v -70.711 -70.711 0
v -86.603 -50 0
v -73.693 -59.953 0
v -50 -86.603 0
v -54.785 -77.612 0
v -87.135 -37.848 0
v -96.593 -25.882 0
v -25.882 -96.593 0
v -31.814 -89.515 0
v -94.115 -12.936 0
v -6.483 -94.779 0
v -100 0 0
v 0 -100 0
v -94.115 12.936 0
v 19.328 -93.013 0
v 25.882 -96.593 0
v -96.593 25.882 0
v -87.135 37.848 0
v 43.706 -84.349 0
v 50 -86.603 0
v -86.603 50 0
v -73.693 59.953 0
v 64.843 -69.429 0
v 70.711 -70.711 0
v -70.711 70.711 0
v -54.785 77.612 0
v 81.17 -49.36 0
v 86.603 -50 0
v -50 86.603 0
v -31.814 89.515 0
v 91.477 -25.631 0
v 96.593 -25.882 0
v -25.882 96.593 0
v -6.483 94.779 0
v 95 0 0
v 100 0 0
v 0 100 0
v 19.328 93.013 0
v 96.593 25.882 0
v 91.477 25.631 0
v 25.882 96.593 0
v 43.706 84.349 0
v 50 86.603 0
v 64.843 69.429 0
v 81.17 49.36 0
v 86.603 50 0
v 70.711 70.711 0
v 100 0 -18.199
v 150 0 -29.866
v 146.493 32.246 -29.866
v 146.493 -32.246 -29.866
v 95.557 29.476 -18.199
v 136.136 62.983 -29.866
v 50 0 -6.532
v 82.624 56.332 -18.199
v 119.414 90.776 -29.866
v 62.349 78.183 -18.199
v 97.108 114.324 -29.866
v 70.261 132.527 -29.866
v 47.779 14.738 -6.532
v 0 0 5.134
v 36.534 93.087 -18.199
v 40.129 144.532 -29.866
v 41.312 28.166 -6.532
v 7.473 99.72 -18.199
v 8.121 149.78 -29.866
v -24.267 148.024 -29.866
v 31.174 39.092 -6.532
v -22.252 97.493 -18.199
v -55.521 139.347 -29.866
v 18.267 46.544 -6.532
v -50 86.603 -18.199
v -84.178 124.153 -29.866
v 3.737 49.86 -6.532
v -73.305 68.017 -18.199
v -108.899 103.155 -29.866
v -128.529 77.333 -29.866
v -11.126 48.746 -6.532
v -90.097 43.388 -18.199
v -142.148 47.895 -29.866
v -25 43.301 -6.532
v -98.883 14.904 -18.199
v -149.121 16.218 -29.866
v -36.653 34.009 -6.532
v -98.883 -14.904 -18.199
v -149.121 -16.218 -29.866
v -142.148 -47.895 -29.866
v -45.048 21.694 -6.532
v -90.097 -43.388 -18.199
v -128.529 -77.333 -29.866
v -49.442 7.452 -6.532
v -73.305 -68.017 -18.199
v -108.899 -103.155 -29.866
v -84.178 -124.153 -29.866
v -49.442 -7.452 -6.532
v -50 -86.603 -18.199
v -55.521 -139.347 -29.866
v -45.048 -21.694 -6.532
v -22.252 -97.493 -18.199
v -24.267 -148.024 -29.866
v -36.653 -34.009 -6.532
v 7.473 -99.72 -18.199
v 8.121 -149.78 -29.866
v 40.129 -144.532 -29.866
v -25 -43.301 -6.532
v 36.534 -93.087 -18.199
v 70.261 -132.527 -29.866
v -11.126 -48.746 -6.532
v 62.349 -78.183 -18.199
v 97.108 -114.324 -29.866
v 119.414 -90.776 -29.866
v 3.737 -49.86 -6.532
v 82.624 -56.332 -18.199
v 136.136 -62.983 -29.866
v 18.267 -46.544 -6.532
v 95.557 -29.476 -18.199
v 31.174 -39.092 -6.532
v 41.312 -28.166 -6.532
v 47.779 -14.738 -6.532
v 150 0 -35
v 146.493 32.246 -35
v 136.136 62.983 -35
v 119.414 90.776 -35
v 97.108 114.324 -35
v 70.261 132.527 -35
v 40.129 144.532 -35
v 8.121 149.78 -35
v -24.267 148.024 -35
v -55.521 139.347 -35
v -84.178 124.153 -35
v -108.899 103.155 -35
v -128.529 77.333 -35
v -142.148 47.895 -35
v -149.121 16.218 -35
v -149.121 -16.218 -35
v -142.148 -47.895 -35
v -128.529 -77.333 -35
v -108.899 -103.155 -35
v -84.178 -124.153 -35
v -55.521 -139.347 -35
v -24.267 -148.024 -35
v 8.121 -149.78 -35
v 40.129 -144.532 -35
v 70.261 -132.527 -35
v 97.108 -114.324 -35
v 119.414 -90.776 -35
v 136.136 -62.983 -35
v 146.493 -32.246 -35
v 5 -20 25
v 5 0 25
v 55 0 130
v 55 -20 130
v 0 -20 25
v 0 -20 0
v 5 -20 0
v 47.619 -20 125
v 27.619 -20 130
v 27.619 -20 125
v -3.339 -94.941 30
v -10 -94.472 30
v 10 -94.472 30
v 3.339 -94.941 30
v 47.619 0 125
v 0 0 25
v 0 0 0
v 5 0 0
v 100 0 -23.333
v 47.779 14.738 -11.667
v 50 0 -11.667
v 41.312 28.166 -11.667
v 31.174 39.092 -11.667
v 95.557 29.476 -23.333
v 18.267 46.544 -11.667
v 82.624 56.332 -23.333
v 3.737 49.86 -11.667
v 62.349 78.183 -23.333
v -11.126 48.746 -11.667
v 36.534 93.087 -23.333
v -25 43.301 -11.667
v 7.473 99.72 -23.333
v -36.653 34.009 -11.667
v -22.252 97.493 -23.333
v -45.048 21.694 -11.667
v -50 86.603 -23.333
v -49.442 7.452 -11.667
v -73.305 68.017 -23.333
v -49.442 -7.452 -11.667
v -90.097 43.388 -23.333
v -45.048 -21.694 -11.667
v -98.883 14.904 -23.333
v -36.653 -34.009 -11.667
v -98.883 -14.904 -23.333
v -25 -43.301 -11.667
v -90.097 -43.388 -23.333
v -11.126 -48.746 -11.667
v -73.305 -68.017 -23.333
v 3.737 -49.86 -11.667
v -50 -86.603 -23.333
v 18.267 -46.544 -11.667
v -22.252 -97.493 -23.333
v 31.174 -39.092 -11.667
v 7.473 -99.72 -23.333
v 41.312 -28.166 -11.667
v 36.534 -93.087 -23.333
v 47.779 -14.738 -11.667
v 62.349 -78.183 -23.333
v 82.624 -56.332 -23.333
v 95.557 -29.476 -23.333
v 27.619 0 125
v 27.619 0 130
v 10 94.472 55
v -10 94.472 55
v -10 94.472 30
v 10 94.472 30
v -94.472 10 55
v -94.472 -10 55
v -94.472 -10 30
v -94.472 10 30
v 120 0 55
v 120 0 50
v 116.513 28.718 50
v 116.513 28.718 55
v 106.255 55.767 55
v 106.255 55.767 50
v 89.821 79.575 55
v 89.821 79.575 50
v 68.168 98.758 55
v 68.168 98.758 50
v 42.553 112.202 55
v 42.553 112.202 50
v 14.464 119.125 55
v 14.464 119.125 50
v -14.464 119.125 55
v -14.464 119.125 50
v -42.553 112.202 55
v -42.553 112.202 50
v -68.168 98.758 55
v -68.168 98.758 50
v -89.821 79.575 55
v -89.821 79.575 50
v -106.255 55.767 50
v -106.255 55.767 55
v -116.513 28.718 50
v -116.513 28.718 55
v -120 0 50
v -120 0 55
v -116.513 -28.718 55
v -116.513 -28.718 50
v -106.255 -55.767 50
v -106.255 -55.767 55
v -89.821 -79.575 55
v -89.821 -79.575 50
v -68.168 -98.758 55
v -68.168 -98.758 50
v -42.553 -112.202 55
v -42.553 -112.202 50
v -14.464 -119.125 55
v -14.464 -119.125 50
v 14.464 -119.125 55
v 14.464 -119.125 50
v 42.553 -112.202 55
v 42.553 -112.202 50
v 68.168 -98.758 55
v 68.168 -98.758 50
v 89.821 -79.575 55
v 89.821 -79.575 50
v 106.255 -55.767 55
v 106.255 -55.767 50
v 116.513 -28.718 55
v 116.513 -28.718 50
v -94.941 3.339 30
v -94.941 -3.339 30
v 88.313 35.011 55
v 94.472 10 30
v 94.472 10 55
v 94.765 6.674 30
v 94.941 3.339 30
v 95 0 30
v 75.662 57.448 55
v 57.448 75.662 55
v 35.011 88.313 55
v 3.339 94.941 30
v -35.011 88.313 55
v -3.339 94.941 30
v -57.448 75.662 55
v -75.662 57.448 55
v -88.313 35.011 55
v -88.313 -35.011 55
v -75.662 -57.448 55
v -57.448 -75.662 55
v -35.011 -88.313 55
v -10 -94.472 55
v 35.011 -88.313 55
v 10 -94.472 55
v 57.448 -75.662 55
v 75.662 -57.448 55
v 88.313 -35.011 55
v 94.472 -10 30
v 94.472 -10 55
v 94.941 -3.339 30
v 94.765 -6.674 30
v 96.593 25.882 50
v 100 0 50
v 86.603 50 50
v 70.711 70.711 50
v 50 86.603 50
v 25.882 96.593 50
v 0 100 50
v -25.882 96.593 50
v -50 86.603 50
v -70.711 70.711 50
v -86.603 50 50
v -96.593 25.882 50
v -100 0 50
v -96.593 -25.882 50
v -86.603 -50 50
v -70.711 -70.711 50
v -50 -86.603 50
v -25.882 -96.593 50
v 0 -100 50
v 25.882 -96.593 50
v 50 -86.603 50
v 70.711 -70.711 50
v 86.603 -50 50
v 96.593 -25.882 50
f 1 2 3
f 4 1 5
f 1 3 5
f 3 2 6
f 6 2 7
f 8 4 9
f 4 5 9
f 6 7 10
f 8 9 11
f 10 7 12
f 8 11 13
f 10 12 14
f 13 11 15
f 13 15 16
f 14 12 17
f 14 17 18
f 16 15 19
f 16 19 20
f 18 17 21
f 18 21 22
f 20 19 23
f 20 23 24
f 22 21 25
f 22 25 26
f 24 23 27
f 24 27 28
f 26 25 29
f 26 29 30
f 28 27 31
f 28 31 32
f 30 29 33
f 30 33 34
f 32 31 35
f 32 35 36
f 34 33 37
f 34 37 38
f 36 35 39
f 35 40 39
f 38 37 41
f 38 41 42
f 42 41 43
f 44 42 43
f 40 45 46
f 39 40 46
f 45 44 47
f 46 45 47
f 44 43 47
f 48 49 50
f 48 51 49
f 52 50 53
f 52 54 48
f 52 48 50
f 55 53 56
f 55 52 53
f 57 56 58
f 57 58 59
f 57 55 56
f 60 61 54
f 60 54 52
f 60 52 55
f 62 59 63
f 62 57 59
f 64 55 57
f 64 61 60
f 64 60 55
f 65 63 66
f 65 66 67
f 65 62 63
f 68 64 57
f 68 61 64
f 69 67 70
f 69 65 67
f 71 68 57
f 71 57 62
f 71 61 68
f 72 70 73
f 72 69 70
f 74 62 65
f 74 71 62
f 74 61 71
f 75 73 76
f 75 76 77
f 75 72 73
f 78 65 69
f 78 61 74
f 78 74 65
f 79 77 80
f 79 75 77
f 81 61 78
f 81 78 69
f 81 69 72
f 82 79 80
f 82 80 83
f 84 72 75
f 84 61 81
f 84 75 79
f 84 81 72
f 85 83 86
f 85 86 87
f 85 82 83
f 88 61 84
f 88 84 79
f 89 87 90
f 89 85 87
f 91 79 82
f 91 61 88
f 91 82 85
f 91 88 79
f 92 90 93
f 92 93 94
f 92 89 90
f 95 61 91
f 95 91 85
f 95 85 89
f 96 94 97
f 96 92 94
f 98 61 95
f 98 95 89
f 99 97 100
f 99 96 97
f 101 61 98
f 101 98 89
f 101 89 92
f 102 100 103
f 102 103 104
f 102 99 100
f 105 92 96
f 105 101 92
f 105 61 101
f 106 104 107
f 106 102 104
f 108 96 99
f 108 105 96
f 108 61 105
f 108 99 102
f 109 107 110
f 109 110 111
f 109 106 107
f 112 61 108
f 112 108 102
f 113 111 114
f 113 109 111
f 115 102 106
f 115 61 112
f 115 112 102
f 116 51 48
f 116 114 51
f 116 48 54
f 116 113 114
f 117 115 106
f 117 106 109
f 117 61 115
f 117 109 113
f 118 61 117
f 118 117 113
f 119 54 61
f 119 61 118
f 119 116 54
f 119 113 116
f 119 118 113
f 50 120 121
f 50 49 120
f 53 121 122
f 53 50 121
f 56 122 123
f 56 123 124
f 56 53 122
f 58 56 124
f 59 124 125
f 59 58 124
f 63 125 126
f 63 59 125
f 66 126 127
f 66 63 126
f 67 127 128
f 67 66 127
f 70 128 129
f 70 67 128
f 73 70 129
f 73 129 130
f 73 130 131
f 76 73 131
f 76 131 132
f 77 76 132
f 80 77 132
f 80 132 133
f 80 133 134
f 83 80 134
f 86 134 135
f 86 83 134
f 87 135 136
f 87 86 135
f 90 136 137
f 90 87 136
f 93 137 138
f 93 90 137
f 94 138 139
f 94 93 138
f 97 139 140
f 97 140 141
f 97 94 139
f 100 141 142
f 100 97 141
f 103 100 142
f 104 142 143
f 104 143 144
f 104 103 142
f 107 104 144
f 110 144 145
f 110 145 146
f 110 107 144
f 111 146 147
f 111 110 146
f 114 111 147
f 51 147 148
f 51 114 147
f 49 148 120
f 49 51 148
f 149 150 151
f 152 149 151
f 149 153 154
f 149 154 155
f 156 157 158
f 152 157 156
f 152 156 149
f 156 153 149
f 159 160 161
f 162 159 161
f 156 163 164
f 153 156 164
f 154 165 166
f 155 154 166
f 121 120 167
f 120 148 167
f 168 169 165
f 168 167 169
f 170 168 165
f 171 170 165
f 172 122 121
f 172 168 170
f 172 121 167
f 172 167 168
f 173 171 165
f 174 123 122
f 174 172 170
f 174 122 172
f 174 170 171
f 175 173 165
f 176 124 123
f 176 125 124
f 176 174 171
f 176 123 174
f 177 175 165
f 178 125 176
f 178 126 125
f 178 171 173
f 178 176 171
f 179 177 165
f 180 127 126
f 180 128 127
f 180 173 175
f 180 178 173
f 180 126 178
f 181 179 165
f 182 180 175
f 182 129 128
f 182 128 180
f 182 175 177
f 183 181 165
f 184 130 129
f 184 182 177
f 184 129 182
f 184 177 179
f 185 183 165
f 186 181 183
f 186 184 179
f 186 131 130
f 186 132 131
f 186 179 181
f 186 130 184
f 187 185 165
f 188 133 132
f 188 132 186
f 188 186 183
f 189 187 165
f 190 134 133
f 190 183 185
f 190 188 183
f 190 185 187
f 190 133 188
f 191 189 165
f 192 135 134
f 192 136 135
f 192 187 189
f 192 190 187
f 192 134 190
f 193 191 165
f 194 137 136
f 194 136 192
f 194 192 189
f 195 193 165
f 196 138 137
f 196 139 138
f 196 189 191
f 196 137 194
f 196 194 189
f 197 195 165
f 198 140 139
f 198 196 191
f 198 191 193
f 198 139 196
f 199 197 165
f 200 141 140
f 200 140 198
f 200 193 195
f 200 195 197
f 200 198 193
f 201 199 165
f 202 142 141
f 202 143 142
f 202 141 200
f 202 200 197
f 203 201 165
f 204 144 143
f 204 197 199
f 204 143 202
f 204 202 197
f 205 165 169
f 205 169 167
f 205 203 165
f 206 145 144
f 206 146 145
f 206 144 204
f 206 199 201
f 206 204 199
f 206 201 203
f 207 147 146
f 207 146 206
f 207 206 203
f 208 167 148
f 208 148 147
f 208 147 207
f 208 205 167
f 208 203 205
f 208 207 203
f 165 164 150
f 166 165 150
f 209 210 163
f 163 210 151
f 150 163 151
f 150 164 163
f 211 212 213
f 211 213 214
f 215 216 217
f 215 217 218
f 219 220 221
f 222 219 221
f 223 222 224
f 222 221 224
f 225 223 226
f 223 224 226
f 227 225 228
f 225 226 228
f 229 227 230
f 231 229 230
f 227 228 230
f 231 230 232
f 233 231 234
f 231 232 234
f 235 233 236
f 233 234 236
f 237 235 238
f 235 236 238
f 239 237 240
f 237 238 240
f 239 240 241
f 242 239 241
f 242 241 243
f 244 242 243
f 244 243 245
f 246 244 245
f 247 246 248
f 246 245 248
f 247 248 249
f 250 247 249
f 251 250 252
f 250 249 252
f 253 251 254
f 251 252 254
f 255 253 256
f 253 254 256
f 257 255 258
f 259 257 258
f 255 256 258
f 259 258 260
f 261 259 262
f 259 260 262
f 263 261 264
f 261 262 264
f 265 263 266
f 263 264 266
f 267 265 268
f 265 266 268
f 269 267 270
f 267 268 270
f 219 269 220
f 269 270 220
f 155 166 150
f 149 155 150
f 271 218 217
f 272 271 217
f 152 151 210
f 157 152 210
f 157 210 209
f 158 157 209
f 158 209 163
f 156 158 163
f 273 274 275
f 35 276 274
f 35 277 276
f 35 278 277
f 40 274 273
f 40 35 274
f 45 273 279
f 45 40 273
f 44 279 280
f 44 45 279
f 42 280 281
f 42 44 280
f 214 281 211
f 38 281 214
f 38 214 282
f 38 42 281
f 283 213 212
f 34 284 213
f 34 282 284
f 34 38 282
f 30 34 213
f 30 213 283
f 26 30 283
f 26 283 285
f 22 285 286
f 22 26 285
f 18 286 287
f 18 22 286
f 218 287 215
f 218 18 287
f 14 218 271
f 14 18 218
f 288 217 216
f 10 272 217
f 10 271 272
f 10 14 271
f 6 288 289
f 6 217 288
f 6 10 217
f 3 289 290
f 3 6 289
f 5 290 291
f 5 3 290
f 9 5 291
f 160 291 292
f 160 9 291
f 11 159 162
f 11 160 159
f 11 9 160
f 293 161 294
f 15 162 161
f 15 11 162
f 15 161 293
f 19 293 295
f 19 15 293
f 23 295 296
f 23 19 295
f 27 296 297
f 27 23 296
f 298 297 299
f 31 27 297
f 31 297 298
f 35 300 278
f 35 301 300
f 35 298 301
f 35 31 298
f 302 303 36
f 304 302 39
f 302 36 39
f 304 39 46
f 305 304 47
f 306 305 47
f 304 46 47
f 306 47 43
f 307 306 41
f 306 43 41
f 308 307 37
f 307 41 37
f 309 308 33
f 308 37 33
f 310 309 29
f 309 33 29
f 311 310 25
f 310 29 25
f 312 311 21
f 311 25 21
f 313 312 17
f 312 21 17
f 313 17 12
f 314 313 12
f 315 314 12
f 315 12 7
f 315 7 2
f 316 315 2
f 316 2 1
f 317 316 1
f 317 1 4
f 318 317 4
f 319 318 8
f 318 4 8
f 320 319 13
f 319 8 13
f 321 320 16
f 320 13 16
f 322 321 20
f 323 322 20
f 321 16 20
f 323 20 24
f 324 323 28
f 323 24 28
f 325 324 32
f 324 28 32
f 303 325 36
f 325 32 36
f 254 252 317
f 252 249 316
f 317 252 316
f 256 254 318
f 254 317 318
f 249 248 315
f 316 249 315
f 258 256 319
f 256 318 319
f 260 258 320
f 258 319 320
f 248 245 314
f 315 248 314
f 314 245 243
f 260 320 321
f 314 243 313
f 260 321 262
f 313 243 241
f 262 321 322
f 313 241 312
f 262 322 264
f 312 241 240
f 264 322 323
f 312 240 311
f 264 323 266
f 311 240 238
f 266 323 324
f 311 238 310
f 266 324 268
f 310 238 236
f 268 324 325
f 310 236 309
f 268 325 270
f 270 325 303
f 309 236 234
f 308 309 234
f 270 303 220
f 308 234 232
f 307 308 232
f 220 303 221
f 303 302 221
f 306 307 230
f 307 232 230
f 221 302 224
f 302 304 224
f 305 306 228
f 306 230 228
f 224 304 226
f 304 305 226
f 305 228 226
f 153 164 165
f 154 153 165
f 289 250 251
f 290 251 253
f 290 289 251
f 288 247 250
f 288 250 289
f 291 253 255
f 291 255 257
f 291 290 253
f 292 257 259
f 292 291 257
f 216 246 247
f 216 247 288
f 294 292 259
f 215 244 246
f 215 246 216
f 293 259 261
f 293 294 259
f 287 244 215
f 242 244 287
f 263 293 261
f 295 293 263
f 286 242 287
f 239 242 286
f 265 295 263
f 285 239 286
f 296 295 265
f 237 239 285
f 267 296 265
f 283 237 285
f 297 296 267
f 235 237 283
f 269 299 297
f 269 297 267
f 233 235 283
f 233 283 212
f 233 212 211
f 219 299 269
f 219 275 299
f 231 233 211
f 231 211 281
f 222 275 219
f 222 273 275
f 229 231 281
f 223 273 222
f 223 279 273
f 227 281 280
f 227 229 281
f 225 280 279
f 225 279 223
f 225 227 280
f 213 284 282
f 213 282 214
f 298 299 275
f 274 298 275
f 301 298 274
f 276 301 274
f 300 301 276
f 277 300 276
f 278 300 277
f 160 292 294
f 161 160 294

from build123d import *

# Parameters (mm, degrees)
F3_R      = 100
F3_R_2    = 95
F4_DEPTH  = 50
F5_R      = 120
F5_R_2    = 100
F5_R_3    = 95
F6_DEPTH  = 5
F7_W      = 5
F7_H      = 20
F7_W_2    = 20
F7_H_2    = 5
F8_DEPTH  = 25
F10_DEPTH = 20


with BuildPart() as f2:
    # F0 (on Front) → F2 (revolve)
    with BuildSketch(Plane.XZ):
        Polygon((150, -29.865693), (0, 5.134307), (0, 0), (150, -35), align=None)
    revolve(axis=Axis((0, 0, 19.440636), (0, 0, 1)))


with BuildPart() as f4:
    # F3 (on Top) → F4 (new body)
    with BuildSketch(Plane.XY):
        Circle(F3_R)
        Circle(F3_R_2, mode=Mode.SUBTRACT)
    extrude(amount=F4_DEPTH)

    # F5 (on face) → F6 (join)
    with BuildSketch(Plane.XY.offset(50)):
        Circle(F5_R)
        Circle(F5_R_2, mode=Mode.SUBTRACT)
        Circle(F5_R_2)
        Circle(F5_R_3, mode=Mode.SUBTRACT)
    extrude(amount=F6_DEPTH)

    # F7 (on face) → F8 (join)
    with BuildSketch(Plane.XY.offset(55)):
        with Locations((-96.972218, 0)):
            Rectangle(F7_W, F7_H)
        with Locations((0, -96.972218)):
            Rectangle(F7_W_2, F7_H_2)
        with Locations((96.972218, 0)):
            Rectangle(F7_W, F7_H)
        with Locations((0, 96.972218)):
            Rectangle(F7_W_2, F7_H_2)
    extrude(amount=-F8_DEPTH)


with BuildPart() as f10:
    # F9 (on Front) → F10 (new body)
    with BuildSketch(Plane.XZ):
        Polygon((0, 25), (0, 0), (5, 0), (5, 25), (55, 130), (27.619048, 130), (27.619048, 125), (47.619048, 125), align=None)
    extrude(amount=F10_DEPTH)


solid = Compound([f2.part, f4.part, f10.part])
